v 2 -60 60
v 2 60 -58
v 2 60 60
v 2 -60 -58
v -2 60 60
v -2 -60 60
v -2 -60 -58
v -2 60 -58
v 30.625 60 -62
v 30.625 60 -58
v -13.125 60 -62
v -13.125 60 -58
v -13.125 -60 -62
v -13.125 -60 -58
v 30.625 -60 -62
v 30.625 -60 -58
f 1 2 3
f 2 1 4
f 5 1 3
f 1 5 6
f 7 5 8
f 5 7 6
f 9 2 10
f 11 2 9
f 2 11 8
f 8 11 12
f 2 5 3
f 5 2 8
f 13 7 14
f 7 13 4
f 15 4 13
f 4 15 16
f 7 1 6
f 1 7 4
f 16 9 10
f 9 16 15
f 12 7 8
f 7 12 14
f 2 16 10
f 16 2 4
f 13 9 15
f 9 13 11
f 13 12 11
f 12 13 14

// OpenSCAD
d_vesa = 120;
t_stand = 4;
w_nuc = 35;

w_base = w_nuc*1.25;

difference() {
  union() {
    // vertical
    cube([t_stand, d_vesa, d_vesa], center = true);
    // base
    translate([w_base-w_nuc, 0, -d_vesa/2]) {
      cube([w_base, d_vesa, t_stand], center = true);
    }
  }
}
